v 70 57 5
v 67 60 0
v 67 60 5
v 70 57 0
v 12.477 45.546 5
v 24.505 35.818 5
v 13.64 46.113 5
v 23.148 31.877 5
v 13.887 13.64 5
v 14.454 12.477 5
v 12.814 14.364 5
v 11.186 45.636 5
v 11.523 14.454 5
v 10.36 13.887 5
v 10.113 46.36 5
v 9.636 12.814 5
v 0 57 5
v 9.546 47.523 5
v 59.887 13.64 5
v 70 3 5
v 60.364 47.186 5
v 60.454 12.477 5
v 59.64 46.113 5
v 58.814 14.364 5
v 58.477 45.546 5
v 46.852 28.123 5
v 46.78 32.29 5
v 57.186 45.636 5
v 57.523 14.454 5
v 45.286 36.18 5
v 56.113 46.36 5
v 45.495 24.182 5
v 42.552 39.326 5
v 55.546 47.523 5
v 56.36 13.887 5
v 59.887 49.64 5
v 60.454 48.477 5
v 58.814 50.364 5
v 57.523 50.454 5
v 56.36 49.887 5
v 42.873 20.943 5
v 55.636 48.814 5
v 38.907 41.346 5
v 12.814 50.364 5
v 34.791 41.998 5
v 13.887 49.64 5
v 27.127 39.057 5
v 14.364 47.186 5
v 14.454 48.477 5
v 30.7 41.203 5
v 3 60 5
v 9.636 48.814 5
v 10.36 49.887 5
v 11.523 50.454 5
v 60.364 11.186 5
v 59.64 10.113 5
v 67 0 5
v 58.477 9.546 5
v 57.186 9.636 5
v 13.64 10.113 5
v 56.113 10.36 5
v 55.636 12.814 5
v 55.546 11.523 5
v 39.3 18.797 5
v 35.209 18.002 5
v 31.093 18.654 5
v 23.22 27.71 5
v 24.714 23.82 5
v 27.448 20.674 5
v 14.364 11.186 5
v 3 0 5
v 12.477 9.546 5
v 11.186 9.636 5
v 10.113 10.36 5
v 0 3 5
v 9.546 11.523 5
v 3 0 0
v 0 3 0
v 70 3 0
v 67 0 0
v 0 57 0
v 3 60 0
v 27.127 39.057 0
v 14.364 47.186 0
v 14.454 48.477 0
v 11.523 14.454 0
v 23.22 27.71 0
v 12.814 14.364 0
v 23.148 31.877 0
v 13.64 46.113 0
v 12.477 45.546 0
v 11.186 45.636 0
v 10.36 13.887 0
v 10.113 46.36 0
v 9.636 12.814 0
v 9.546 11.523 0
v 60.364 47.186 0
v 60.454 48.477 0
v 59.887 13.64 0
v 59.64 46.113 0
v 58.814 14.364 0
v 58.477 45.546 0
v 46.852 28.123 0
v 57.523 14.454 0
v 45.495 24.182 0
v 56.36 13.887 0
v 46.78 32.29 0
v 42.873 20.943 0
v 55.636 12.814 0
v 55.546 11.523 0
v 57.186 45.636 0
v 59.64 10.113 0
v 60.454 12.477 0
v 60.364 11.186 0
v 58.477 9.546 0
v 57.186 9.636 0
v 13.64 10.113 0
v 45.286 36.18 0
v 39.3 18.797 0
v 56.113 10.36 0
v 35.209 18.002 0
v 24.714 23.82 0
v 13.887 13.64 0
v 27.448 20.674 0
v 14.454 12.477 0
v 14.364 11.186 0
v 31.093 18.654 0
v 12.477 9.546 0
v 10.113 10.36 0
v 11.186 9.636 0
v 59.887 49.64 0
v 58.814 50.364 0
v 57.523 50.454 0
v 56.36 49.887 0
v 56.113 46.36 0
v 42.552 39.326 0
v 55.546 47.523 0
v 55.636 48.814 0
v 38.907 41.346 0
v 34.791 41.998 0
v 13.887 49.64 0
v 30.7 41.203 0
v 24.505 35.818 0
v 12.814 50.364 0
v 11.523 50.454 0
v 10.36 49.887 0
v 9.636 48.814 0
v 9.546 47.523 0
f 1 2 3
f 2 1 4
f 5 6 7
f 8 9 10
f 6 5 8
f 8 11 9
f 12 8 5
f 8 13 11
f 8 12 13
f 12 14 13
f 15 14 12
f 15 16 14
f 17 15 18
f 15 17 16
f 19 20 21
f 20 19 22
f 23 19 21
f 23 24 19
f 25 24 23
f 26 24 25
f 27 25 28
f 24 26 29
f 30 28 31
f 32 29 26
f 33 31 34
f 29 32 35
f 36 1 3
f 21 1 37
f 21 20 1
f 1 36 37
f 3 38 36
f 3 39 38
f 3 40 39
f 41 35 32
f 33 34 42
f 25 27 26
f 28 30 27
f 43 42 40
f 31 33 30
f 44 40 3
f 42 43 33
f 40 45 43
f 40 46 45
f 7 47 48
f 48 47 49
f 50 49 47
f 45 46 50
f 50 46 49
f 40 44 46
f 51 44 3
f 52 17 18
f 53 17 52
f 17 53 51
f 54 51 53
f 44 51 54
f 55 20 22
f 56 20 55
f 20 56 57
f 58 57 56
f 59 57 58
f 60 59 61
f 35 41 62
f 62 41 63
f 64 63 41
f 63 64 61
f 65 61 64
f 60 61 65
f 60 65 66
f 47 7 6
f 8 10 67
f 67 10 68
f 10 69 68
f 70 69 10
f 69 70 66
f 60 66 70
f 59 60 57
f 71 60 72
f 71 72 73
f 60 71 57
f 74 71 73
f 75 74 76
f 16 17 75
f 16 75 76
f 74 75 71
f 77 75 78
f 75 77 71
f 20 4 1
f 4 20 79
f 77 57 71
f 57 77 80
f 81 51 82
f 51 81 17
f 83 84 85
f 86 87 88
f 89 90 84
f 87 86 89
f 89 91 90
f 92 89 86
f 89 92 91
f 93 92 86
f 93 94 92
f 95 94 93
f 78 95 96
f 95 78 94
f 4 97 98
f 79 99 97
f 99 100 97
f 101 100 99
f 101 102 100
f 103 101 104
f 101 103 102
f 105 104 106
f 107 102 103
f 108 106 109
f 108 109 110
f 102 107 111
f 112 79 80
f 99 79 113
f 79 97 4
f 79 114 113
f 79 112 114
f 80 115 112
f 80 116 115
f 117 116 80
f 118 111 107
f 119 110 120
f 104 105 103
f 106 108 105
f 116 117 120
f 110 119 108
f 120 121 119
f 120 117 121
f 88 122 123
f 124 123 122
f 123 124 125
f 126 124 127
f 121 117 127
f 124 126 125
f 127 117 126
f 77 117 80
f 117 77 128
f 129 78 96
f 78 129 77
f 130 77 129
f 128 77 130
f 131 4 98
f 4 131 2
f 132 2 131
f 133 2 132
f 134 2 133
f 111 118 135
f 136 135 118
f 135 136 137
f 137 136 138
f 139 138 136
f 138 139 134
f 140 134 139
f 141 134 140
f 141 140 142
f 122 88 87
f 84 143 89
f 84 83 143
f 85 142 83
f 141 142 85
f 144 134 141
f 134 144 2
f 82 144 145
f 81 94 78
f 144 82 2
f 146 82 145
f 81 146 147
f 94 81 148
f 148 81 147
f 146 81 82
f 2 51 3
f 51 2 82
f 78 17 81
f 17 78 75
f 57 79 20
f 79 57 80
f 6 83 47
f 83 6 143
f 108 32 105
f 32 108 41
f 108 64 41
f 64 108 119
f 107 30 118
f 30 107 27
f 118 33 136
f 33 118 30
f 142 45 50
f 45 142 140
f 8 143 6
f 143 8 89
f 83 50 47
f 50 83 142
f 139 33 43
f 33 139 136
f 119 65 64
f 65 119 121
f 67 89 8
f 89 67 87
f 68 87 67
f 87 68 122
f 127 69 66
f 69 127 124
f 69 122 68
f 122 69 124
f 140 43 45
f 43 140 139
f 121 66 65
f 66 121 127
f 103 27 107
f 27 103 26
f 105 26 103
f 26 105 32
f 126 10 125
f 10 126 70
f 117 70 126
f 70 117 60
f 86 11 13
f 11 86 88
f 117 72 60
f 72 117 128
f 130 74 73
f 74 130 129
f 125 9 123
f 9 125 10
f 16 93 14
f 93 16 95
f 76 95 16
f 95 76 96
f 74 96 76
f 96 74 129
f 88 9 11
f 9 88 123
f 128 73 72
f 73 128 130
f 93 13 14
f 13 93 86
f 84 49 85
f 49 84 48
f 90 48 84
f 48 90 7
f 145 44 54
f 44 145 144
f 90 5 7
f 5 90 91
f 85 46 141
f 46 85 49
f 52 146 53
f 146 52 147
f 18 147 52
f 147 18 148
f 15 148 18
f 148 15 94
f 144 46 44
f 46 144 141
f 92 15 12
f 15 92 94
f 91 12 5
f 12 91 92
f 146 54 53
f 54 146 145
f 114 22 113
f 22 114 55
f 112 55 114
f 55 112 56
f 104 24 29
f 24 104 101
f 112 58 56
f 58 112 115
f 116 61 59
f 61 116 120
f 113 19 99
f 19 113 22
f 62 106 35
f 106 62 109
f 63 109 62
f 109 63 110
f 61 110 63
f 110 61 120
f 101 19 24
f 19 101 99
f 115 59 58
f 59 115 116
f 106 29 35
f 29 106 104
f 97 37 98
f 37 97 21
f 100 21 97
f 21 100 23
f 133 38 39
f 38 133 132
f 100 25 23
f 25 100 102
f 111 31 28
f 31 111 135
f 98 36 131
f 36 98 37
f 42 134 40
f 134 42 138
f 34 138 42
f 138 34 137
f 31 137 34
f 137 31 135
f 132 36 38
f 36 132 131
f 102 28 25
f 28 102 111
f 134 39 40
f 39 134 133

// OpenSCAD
$fn = 32;

// ----------------------------------------------------------------------
// Spacer plate: rect 70 x 60
// ----------------------------------------------------------------------

// --- parameters (mm) ---
bore_r = 12;              // centre bore radius
bolt_r = 2.5;             // bolt hole radius
plate_t = 5;              // plate thickness, Z (extrusion height)
plate_l = 70;             // plate length, X
plate_w = 60;             // plate width, Y
inset = 12;               // corner hole inset
fit_tol = 0.05;           // declared fit tolerance (prompt contract)
free_tol = 0.2;           // declared free tolerance (prompt contract)

profile = [[3, 0], [67, 0], [70, 3], [70, 57], [67, 60], [3, 60], [0, 57], [0, 3]];  // primary outline, 8 points, counter clockwise
void_1 = [[46.78, 32.29], [45.286, 36.18], [42.552, 39.326], [38.907, 41.346], [34.791, 41.998], [30.7, 41.203], [27.127, 39.057], [24.505, 35.818], [23.148, 31.877], [23.22, 27.71], [24.714, 23.82], [27.448, 20.674], [31.093, 18.654], [35.209, 18.002], [39.3, 18.797], [42.873, 20.943], [45.495, 24.182], [46.852, 28.123]];  // centre bore, 18 points
void_2 = [[14.454, 12.477], [13.887, 13.64], [12.814, 14.364], [11.523, 14.454], [10.36, 13.887], [9.636, 12.814], [9.546, 11.523], [10.113, 10.36], [11.186, 9.636], [12.477, 9.546], [13.64, 10.113], [14.364, 11.186]];  // corner hole, 12 points
void_3 = [[14.454, 48.477], [13.887, 49.64], [12.814, 50.364], [11.523, 50.454], [10.36, 49.887], [9.636, 48.814], [9.546, 47.523], [10.113, 46.36], [11.186, 45.636], [12.477, 45.546], [13.64, 46.113], [14.364, 47.186]];  // corner hole, 12 points
void_4 = [[60.454, 12.477], [59.887, 13.64], [58.814, 14.364], [57.523, 14.454], [56.36, 13.887], [55.636, 12.814], [55.546, 11.523], [56.113, 10.36], [57.186, 9.636], [58.477, 9.546], [59.64, 10.113], [60.364, 11.186]];  // corner hole, 12 points
void_5 = [[60.454, 48.477], [59.887, 49.64], [58.814, 50.364], [57.523, 50.454], [56.36, 49.887], [55.636, 48.814], [55.546, 47.523], [56.113, 46.36], [57.186, 45.636], [58.477, 45.546], [59.64, 46.113], [60.364, 47.186]];  // corner hole, 12 points

// --- the one profile operation ---
difference() {
  linear_extrude(height = plate_t) polygon(points = profile);
  translate([0, 0, -1])
    linear_extrude(height = plate_t + 2) polygon(points = void_1);
  translate([0, 0, -1])
    linear_extrude(height = plate_t + 2) polygon(points = void_2);
  translate([0, 0, -1])
    linear_extrude(height = plate_t + 2) polygon(points = void_3);
  translate([0, 0, -1])
    linear_extrude(height = plate_t + 2) polygon(points = void_4);
  translate([0, 0, -1])
    linear_extrude(height = plate_t + 2) polygon(points = void_5);
}
